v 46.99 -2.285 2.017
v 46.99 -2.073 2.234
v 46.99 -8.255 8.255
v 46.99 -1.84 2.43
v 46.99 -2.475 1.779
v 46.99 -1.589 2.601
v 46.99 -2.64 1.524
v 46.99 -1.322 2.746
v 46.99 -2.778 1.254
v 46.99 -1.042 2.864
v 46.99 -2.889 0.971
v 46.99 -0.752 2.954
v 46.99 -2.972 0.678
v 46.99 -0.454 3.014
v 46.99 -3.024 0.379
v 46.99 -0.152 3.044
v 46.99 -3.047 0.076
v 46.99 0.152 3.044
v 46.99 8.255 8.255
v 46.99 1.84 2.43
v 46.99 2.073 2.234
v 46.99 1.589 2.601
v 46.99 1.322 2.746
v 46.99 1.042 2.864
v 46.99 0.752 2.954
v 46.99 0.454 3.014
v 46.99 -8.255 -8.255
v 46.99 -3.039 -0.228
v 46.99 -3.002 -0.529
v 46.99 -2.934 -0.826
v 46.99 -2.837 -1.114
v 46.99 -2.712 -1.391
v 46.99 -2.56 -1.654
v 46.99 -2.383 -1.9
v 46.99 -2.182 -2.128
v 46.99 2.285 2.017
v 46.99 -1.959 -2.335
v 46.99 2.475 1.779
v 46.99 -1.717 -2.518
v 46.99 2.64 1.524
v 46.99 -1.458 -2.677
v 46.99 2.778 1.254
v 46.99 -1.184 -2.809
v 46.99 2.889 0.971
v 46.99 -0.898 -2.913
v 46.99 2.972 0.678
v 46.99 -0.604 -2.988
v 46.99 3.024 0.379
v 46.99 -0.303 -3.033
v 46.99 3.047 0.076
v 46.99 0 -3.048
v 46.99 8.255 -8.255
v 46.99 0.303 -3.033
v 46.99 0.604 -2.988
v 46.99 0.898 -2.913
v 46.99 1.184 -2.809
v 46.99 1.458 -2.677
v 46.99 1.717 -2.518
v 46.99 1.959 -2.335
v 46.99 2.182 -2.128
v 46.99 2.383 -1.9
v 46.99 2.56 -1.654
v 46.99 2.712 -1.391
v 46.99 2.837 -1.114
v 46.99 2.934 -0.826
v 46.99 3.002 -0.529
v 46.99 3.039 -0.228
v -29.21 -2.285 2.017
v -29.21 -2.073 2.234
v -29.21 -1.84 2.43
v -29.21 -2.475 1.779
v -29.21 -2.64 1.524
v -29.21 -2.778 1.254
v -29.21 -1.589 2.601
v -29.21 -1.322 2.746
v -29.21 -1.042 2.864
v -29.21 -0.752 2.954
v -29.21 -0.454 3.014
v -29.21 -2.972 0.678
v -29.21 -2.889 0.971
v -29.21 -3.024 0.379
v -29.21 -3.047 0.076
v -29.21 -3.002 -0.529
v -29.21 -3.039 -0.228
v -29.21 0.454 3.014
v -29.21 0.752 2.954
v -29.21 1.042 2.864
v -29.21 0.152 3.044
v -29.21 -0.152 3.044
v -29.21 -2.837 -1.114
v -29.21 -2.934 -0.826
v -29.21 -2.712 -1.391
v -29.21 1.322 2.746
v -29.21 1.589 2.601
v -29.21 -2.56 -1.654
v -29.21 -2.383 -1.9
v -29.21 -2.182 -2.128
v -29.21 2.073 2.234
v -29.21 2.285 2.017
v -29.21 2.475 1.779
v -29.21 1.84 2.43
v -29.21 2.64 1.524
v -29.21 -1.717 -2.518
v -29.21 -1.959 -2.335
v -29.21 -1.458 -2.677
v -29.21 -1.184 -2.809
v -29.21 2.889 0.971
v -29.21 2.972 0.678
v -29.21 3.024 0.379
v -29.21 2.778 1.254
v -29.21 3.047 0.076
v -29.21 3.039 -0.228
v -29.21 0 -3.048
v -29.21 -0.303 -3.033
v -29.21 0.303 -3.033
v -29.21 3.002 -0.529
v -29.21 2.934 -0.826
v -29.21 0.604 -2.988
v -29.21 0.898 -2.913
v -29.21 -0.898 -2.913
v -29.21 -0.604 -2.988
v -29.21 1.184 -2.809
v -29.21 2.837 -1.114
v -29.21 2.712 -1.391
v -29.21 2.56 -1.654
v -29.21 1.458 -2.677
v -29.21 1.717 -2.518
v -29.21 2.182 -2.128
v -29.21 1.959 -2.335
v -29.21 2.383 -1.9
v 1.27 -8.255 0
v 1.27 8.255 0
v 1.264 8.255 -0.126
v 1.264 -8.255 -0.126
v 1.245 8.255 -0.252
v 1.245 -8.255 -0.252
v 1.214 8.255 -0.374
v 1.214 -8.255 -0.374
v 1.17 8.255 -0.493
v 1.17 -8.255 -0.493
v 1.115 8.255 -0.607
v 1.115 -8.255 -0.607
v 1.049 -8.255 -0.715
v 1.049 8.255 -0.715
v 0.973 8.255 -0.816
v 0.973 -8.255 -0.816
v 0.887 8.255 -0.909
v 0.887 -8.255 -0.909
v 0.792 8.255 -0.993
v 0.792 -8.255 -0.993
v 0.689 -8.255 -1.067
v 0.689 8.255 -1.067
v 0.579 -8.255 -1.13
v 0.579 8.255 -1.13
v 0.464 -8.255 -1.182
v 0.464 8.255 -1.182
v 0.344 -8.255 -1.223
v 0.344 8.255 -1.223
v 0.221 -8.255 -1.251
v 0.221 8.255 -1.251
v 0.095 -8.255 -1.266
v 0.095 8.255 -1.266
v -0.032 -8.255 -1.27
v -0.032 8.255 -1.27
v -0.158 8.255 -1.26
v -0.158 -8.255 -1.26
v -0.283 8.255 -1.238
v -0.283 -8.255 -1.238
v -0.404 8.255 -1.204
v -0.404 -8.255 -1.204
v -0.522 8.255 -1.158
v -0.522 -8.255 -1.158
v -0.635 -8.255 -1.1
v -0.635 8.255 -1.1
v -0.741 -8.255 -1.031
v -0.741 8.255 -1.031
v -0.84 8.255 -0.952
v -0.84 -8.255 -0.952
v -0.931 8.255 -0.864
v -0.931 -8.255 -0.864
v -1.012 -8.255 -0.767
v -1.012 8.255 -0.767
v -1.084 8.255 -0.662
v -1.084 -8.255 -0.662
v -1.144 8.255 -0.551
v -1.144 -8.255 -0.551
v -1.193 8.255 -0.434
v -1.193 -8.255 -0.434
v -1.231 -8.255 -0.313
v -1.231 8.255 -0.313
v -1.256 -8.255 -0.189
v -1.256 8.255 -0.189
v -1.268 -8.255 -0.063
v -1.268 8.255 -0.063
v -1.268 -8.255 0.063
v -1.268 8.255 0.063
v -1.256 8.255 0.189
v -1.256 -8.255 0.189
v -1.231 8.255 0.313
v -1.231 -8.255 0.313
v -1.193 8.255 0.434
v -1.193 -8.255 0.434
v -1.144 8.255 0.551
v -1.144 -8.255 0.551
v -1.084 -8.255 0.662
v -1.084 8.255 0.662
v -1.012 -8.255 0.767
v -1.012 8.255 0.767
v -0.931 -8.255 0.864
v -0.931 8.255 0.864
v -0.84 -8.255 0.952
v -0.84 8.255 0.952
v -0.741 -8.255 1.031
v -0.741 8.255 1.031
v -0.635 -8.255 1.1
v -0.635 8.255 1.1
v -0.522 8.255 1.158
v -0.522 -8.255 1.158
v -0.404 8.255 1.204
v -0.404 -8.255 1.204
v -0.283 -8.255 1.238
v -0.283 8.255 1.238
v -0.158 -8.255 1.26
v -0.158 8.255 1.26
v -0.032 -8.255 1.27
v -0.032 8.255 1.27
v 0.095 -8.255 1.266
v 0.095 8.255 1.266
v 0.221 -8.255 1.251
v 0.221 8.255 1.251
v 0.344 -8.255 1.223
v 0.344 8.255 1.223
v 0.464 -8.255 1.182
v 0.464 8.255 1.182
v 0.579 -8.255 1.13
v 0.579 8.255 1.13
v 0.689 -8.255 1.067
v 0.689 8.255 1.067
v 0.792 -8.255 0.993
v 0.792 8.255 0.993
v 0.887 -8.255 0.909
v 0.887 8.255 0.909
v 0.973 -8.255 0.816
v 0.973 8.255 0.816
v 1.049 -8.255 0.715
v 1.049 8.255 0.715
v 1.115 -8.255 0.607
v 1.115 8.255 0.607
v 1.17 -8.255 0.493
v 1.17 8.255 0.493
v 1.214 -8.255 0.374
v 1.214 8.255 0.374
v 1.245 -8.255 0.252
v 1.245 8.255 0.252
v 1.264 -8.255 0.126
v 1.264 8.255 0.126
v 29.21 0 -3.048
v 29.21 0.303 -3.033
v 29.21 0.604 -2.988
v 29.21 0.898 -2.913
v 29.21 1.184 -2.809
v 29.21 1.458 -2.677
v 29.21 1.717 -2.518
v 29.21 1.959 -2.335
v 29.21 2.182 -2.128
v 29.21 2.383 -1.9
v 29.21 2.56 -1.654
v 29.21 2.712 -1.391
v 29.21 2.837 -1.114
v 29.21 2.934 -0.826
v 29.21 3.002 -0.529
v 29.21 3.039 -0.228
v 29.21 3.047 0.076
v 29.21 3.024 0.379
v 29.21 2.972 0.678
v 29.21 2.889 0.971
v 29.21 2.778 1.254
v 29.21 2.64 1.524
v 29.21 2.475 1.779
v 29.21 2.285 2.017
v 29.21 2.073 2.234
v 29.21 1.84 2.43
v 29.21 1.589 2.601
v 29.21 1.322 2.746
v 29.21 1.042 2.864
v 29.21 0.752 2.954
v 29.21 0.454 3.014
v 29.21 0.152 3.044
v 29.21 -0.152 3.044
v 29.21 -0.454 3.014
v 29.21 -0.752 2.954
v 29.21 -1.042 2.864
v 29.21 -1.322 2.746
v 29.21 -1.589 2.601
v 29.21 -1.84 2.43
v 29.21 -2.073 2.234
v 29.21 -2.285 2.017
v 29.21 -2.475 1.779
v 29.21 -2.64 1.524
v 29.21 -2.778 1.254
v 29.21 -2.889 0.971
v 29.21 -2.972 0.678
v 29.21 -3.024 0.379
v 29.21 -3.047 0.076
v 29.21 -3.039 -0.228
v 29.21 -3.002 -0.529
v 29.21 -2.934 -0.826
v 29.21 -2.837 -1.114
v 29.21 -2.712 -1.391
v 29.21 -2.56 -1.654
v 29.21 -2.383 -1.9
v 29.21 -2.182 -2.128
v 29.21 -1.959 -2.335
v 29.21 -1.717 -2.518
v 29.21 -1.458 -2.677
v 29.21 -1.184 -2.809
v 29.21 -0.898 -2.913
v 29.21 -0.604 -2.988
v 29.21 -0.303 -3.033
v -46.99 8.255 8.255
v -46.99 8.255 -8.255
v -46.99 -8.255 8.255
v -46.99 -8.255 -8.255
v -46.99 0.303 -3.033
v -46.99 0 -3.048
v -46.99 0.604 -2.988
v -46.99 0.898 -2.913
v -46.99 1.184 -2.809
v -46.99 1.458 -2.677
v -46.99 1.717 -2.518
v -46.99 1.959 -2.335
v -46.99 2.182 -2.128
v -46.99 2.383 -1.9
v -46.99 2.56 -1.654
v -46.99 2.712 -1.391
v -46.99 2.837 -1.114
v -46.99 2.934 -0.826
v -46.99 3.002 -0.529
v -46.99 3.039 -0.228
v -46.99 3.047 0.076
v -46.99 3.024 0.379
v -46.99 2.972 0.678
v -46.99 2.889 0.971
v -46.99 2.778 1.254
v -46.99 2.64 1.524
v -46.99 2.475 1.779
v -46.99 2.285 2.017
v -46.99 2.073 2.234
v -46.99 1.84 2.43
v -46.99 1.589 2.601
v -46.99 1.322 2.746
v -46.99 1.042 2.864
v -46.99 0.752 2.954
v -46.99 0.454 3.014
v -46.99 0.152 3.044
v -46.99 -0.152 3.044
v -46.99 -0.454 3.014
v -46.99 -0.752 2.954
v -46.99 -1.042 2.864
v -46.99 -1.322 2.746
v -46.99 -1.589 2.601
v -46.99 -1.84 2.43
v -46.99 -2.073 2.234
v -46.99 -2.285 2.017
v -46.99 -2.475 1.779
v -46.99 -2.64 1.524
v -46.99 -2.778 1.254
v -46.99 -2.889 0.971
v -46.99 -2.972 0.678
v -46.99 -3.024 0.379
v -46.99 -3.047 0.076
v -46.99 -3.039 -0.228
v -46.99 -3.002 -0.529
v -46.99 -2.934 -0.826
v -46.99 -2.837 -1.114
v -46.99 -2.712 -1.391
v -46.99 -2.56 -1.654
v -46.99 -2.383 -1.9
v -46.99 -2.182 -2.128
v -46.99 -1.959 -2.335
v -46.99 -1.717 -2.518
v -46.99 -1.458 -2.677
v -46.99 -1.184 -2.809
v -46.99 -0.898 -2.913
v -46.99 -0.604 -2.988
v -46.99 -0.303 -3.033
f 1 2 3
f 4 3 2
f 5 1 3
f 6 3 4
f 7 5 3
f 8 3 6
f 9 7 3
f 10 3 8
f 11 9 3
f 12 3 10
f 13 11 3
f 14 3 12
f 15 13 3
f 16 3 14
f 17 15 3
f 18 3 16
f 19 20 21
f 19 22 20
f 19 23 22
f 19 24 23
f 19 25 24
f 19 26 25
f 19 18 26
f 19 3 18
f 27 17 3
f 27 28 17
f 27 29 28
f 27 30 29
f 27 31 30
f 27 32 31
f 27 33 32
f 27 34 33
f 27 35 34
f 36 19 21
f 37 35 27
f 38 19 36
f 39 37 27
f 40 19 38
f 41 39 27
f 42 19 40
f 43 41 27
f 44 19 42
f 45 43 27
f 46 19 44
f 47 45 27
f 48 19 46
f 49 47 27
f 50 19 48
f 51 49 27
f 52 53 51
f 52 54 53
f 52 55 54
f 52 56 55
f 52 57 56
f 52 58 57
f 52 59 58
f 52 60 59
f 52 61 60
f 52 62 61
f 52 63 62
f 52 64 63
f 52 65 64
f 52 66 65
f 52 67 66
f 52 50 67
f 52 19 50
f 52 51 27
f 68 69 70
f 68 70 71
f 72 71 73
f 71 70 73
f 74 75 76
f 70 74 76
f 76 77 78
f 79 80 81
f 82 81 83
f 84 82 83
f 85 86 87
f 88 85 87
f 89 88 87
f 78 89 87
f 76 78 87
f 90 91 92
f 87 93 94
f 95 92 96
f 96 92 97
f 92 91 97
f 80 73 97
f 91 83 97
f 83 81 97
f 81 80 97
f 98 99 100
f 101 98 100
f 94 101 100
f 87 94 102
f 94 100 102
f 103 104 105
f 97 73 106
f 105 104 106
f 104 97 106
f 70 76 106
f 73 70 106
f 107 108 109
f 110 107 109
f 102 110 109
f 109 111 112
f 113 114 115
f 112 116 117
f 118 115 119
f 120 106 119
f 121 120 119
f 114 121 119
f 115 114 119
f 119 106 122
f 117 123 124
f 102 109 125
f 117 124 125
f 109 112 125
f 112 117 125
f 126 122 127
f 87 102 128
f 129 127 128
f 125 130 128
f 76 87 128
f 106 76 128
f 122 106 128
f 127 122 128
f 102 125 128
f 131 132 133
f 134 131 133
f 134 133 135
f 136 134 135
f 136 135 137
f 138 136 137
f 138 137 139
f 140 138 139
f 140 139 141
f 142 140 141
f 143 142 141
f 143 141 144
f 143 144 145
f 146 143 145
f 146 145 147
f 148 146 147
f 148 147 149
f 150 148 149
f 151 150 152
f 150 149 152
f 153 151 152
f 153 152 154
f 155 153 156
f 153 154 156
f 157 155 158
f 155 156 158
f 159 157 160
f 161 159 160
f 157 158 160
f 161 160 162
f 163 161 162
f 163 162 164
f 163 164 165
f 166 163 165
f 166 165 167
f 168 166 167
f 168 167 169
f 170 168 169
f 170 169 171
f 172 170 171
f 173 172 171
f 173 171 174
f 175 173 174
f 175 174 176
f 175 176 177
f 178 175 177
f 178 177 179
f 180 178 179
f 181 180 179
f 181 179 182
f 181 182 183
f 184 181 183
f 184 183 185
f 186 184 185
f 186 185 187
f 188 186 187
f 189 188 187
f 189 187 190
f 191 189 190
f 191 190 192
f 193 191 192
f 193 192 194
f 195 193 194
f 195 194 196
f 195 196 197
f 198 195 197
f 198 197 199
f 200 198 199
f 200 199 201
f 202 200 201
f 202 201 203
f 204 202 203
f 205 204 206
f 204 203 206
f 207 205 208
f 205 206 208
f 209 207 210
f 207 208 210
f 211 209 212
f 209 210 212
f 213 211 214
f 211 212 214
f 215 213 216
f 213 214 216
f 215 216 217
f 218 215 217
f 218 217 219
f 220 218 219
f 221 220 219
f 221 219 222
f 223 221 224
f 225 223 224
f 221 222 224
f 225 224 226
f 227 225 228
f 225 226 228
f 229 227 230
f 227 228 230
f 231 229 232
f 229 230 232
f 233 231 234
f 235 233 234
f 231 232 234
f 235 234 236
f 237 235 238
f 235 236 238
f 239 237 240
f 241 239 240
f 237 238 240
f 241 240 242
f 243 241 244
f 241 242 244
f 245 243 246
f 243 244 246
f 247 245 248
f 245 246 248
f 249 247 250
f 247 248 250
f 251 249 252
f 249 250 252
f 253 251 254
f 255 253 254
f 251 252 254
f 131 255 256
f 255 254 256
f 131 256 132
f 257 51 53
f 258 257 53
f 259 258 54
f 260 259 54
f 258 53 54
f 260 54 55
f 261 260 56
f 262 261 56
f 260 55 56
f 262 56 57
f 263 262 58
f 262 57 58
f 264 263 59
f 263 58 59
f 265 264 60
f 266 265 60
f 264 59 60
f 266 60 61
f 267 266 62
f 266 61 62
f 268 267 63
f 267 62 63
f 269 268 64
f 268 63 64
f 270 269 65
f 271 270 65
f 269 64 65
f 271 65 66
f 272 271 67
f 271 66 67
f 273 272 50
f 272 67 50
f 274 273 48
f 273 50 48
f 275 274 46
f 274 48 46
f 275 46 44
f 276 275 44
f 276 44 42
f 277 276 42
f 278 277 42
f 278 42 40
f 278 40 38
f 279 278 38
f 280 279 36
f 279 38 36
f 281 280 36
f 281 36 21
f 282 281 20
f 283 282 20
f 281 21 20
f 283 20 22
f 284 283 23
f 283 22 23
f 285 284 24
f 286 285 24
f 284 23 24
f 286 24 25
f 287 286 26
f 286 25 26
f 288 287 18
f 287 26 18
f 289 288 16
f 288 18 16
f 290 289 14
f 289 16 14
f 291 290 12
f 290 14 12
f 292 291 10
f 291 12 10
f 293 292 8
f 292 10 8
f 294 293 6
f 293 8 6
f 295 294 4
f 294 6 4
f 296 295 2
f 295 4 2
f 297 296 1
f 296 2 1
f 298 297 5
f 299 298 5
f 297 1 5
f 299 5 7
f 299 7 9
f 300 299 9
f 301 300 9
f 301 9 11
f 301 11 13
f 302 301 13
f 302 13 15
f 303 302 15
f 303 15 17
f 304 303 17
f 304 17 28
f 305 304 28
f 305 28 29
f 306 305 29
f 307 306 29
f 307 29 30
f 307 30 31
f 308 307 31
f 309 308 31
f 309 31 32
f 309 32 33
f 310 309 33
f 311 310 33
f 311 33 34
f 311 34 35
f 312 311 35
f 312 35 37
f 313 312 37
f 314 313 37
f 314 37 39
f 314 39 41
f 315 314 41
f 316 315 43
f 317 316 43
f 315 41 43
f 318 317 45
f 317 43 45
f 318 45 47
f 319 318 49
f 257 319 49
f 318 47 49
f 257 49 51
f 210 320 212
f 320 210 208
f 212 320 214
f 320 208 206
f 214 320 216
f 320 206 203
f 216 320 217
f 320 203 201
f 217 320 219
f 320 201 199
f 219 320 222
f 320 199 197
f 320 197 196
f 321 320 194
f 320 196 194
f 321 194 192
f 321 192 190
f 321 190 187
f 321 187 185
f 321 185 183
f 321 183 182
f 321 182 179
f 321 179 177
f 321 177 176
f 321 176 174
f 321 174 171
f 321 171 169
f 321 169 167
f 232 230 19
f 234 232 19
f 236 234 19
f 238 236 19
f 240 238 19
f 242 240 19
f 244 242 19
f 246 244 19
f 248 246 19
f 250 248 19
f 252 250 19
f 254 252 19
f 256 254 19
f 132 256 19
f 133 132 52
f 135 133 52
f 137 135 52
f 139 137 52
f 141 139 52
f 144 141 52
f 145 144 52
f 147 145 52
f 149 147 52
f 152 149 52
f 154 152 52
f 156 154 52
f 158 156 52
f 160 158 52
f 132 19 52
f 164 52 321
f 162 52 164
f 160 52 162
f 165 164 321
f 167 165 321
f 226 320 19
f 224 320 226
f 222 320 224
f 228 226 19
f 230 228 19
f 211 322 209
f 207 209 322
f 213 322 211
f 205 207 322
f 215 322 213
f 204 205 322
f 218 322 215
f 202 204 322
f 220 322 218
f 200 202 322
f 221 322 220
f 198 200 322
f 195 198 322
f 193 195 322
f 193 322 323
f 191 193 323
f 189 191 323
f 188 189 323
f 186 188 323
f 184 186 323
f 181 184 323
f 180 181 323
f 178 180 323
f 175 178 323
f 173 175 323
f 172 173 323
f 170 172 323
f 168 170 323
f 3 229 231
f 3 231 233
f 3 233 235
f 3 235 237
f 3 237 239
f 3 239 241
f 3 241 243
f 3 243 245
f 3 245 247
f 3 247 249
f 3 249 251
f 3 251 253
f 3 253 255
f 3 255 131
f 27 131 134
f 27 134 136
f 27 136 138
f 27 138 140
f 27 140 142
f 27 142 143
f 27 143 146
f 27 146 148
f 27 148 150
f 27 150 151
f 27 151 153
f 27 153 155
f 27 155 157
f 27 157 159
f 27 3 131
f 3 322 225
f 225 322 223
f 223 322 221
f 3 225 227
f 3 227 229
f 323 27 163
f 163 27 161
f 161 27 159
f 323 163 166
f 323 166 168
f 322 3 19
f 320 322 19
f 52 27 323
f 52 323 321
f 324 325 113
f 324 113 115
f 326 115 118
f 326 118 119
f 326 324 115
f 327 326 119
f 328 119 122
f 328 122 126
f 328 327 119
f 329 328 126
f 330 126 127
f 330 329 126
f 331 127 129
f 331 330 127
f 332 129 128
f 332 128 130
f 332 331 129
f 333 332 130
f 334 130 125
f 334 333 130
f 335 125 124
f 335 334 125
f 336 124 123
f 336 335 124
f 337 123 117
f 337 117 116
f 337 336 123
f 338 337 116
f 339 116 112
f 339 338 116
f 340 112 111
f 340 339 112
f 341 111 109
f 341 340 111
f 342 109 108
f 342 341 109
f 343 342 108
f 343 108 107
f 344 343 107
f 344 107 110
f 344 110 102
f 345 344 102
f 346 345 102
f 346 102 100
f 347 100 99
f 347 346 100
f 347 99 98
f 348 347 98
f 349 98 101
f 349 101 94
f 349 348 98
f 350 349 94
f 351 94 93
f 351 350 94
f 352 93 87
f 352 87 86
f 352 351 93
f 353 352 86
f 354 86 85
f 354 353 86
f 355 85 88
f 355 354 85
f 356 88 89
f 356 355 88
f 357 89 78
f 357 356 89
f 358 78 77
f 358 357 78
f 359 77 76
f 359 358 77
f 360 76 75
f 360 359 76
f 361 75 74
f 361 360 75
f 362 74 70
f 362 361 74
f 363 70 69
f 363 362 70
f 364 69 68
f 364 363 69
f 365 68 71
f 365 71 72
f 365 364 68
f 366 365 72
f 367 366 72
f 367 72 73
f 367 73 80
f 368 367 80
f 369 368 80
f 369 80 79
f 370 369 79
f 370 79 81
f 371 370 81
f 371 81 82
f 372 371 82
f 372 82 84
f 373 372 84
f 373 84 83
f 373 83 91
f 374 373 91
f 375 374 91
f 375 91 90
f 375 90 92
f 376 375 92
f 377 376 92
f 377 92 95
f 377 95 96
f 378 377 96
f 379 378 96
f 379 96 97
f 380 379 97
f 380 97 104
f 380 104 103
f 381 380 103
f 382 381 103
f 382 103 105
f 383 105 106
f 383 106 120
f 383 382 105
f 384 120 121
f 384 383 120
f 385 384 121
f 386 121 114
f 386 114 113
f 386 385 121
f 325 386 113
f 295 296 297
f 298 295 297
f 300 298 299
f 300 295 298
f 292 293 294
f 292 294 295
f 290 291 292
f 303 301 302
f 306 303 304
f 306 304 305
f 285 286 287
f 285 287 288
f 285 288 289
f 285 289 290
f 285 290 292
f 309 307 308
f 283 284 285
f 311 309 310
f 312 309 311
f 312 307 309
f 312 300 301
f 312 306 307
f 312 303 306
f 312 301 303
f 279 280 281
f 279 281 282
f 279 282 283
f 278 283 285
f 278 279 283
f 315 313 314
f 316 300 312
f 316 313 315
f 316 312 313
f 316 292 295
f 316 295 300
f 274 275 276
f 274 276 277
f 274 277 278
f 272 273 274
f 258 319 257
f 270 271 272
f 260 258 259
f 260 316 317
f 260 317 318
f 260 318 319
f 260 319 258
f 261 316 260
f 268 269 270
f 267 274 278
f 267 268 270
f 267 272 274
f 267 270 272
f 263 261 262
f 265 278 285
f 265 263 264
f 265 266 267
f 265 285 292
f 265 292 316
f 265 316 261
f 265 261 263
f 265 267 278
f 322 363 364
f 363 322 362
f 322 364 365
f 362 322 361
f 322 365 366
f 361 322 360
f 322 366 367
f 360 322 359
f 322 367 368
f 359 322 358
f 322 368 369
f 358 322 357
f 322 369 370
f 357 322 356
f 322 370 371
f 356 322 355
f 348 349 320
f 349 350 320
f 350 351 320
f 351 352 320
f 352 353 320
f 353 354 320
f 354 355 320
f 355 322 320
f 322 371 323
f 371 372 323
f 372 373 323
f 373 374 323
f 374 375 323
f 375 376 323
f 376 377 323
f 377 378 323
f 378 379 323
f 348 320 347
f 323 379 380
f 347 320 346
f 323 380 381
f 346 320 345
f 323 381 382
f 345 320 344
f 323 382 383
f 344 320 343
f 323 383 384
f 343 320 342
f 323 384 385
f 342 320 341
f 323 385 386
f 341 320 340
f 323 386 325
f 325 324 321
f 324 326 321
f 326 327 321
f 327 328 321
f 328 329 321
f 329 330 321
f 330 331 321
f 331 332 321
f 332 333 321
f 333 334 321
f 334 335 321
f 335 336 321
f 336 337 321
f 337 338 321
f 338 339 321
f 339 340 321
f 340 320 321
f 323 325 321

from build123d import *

# Parameters (mm, degrees)
SKETCH1_W           = 16.51
SKETCH1_H           = 16.51
BOSS_EXTRUDE1_DEPTH = 46.99
SKETCH2_R           = 3.048
CUT_EXTRUDE1_DEPTH  = 17.78
CUT_EXTRUDE2_START  = 8.255
SKETCH3_R           = 1.27
CUT_EXTRUDE2_DEPTH  = 17.51


with BuildPart() as part:
    # Sketch1 → Boss-Extrude1 (new body, symmetric)
    with BuildSketch(Plane(origin=(0, 0, 0), x_dir=(0, 0, -1), z_dir=(1, 0, 0))):
        Rectangle(SKETCH1_W, SKETCH1_H)
    extrude(amount=BOSS_EXTRUDE1_DEPTH, both=True)

    # Sketch2 → Cut-Extrude1 (cut)
    with BuildSketch(Plane(origin=(46.99, 0, 0), x_dir=(0, 0, -1), z_dir=(1, 0, 0))):
        Circle(SKETCH2_R)
    cut_extrude1 = extrude(amount=-CUT_EXTRUDE1_DEPTH, mode=Mode.SUBTRACT)

    # Mirror1: Cut-Extrude1 across plane
    add(cut_extrude1.mirror(Plane(origin=(0, 0, 0), x_dir=(0, 0, 1), z_dir=(1, 0, 0))), mode=Mode.SUBTRACT)

    # Sketch3 → Cut-Extrude2 (cut, through all)
    with BuildSketch(Plane(origin=(0, 0, 0), x_dir=(1, 0, 0), z_dir=(0, 1, 0)).offset(CUT_EXTRUDE2_START)):
        Circle(SKETCH3_R)
    extrude(amount=-CUT_EXTRUDE2_DEPTH, mode=Mode.SUBTRACT)


solid = part.part
